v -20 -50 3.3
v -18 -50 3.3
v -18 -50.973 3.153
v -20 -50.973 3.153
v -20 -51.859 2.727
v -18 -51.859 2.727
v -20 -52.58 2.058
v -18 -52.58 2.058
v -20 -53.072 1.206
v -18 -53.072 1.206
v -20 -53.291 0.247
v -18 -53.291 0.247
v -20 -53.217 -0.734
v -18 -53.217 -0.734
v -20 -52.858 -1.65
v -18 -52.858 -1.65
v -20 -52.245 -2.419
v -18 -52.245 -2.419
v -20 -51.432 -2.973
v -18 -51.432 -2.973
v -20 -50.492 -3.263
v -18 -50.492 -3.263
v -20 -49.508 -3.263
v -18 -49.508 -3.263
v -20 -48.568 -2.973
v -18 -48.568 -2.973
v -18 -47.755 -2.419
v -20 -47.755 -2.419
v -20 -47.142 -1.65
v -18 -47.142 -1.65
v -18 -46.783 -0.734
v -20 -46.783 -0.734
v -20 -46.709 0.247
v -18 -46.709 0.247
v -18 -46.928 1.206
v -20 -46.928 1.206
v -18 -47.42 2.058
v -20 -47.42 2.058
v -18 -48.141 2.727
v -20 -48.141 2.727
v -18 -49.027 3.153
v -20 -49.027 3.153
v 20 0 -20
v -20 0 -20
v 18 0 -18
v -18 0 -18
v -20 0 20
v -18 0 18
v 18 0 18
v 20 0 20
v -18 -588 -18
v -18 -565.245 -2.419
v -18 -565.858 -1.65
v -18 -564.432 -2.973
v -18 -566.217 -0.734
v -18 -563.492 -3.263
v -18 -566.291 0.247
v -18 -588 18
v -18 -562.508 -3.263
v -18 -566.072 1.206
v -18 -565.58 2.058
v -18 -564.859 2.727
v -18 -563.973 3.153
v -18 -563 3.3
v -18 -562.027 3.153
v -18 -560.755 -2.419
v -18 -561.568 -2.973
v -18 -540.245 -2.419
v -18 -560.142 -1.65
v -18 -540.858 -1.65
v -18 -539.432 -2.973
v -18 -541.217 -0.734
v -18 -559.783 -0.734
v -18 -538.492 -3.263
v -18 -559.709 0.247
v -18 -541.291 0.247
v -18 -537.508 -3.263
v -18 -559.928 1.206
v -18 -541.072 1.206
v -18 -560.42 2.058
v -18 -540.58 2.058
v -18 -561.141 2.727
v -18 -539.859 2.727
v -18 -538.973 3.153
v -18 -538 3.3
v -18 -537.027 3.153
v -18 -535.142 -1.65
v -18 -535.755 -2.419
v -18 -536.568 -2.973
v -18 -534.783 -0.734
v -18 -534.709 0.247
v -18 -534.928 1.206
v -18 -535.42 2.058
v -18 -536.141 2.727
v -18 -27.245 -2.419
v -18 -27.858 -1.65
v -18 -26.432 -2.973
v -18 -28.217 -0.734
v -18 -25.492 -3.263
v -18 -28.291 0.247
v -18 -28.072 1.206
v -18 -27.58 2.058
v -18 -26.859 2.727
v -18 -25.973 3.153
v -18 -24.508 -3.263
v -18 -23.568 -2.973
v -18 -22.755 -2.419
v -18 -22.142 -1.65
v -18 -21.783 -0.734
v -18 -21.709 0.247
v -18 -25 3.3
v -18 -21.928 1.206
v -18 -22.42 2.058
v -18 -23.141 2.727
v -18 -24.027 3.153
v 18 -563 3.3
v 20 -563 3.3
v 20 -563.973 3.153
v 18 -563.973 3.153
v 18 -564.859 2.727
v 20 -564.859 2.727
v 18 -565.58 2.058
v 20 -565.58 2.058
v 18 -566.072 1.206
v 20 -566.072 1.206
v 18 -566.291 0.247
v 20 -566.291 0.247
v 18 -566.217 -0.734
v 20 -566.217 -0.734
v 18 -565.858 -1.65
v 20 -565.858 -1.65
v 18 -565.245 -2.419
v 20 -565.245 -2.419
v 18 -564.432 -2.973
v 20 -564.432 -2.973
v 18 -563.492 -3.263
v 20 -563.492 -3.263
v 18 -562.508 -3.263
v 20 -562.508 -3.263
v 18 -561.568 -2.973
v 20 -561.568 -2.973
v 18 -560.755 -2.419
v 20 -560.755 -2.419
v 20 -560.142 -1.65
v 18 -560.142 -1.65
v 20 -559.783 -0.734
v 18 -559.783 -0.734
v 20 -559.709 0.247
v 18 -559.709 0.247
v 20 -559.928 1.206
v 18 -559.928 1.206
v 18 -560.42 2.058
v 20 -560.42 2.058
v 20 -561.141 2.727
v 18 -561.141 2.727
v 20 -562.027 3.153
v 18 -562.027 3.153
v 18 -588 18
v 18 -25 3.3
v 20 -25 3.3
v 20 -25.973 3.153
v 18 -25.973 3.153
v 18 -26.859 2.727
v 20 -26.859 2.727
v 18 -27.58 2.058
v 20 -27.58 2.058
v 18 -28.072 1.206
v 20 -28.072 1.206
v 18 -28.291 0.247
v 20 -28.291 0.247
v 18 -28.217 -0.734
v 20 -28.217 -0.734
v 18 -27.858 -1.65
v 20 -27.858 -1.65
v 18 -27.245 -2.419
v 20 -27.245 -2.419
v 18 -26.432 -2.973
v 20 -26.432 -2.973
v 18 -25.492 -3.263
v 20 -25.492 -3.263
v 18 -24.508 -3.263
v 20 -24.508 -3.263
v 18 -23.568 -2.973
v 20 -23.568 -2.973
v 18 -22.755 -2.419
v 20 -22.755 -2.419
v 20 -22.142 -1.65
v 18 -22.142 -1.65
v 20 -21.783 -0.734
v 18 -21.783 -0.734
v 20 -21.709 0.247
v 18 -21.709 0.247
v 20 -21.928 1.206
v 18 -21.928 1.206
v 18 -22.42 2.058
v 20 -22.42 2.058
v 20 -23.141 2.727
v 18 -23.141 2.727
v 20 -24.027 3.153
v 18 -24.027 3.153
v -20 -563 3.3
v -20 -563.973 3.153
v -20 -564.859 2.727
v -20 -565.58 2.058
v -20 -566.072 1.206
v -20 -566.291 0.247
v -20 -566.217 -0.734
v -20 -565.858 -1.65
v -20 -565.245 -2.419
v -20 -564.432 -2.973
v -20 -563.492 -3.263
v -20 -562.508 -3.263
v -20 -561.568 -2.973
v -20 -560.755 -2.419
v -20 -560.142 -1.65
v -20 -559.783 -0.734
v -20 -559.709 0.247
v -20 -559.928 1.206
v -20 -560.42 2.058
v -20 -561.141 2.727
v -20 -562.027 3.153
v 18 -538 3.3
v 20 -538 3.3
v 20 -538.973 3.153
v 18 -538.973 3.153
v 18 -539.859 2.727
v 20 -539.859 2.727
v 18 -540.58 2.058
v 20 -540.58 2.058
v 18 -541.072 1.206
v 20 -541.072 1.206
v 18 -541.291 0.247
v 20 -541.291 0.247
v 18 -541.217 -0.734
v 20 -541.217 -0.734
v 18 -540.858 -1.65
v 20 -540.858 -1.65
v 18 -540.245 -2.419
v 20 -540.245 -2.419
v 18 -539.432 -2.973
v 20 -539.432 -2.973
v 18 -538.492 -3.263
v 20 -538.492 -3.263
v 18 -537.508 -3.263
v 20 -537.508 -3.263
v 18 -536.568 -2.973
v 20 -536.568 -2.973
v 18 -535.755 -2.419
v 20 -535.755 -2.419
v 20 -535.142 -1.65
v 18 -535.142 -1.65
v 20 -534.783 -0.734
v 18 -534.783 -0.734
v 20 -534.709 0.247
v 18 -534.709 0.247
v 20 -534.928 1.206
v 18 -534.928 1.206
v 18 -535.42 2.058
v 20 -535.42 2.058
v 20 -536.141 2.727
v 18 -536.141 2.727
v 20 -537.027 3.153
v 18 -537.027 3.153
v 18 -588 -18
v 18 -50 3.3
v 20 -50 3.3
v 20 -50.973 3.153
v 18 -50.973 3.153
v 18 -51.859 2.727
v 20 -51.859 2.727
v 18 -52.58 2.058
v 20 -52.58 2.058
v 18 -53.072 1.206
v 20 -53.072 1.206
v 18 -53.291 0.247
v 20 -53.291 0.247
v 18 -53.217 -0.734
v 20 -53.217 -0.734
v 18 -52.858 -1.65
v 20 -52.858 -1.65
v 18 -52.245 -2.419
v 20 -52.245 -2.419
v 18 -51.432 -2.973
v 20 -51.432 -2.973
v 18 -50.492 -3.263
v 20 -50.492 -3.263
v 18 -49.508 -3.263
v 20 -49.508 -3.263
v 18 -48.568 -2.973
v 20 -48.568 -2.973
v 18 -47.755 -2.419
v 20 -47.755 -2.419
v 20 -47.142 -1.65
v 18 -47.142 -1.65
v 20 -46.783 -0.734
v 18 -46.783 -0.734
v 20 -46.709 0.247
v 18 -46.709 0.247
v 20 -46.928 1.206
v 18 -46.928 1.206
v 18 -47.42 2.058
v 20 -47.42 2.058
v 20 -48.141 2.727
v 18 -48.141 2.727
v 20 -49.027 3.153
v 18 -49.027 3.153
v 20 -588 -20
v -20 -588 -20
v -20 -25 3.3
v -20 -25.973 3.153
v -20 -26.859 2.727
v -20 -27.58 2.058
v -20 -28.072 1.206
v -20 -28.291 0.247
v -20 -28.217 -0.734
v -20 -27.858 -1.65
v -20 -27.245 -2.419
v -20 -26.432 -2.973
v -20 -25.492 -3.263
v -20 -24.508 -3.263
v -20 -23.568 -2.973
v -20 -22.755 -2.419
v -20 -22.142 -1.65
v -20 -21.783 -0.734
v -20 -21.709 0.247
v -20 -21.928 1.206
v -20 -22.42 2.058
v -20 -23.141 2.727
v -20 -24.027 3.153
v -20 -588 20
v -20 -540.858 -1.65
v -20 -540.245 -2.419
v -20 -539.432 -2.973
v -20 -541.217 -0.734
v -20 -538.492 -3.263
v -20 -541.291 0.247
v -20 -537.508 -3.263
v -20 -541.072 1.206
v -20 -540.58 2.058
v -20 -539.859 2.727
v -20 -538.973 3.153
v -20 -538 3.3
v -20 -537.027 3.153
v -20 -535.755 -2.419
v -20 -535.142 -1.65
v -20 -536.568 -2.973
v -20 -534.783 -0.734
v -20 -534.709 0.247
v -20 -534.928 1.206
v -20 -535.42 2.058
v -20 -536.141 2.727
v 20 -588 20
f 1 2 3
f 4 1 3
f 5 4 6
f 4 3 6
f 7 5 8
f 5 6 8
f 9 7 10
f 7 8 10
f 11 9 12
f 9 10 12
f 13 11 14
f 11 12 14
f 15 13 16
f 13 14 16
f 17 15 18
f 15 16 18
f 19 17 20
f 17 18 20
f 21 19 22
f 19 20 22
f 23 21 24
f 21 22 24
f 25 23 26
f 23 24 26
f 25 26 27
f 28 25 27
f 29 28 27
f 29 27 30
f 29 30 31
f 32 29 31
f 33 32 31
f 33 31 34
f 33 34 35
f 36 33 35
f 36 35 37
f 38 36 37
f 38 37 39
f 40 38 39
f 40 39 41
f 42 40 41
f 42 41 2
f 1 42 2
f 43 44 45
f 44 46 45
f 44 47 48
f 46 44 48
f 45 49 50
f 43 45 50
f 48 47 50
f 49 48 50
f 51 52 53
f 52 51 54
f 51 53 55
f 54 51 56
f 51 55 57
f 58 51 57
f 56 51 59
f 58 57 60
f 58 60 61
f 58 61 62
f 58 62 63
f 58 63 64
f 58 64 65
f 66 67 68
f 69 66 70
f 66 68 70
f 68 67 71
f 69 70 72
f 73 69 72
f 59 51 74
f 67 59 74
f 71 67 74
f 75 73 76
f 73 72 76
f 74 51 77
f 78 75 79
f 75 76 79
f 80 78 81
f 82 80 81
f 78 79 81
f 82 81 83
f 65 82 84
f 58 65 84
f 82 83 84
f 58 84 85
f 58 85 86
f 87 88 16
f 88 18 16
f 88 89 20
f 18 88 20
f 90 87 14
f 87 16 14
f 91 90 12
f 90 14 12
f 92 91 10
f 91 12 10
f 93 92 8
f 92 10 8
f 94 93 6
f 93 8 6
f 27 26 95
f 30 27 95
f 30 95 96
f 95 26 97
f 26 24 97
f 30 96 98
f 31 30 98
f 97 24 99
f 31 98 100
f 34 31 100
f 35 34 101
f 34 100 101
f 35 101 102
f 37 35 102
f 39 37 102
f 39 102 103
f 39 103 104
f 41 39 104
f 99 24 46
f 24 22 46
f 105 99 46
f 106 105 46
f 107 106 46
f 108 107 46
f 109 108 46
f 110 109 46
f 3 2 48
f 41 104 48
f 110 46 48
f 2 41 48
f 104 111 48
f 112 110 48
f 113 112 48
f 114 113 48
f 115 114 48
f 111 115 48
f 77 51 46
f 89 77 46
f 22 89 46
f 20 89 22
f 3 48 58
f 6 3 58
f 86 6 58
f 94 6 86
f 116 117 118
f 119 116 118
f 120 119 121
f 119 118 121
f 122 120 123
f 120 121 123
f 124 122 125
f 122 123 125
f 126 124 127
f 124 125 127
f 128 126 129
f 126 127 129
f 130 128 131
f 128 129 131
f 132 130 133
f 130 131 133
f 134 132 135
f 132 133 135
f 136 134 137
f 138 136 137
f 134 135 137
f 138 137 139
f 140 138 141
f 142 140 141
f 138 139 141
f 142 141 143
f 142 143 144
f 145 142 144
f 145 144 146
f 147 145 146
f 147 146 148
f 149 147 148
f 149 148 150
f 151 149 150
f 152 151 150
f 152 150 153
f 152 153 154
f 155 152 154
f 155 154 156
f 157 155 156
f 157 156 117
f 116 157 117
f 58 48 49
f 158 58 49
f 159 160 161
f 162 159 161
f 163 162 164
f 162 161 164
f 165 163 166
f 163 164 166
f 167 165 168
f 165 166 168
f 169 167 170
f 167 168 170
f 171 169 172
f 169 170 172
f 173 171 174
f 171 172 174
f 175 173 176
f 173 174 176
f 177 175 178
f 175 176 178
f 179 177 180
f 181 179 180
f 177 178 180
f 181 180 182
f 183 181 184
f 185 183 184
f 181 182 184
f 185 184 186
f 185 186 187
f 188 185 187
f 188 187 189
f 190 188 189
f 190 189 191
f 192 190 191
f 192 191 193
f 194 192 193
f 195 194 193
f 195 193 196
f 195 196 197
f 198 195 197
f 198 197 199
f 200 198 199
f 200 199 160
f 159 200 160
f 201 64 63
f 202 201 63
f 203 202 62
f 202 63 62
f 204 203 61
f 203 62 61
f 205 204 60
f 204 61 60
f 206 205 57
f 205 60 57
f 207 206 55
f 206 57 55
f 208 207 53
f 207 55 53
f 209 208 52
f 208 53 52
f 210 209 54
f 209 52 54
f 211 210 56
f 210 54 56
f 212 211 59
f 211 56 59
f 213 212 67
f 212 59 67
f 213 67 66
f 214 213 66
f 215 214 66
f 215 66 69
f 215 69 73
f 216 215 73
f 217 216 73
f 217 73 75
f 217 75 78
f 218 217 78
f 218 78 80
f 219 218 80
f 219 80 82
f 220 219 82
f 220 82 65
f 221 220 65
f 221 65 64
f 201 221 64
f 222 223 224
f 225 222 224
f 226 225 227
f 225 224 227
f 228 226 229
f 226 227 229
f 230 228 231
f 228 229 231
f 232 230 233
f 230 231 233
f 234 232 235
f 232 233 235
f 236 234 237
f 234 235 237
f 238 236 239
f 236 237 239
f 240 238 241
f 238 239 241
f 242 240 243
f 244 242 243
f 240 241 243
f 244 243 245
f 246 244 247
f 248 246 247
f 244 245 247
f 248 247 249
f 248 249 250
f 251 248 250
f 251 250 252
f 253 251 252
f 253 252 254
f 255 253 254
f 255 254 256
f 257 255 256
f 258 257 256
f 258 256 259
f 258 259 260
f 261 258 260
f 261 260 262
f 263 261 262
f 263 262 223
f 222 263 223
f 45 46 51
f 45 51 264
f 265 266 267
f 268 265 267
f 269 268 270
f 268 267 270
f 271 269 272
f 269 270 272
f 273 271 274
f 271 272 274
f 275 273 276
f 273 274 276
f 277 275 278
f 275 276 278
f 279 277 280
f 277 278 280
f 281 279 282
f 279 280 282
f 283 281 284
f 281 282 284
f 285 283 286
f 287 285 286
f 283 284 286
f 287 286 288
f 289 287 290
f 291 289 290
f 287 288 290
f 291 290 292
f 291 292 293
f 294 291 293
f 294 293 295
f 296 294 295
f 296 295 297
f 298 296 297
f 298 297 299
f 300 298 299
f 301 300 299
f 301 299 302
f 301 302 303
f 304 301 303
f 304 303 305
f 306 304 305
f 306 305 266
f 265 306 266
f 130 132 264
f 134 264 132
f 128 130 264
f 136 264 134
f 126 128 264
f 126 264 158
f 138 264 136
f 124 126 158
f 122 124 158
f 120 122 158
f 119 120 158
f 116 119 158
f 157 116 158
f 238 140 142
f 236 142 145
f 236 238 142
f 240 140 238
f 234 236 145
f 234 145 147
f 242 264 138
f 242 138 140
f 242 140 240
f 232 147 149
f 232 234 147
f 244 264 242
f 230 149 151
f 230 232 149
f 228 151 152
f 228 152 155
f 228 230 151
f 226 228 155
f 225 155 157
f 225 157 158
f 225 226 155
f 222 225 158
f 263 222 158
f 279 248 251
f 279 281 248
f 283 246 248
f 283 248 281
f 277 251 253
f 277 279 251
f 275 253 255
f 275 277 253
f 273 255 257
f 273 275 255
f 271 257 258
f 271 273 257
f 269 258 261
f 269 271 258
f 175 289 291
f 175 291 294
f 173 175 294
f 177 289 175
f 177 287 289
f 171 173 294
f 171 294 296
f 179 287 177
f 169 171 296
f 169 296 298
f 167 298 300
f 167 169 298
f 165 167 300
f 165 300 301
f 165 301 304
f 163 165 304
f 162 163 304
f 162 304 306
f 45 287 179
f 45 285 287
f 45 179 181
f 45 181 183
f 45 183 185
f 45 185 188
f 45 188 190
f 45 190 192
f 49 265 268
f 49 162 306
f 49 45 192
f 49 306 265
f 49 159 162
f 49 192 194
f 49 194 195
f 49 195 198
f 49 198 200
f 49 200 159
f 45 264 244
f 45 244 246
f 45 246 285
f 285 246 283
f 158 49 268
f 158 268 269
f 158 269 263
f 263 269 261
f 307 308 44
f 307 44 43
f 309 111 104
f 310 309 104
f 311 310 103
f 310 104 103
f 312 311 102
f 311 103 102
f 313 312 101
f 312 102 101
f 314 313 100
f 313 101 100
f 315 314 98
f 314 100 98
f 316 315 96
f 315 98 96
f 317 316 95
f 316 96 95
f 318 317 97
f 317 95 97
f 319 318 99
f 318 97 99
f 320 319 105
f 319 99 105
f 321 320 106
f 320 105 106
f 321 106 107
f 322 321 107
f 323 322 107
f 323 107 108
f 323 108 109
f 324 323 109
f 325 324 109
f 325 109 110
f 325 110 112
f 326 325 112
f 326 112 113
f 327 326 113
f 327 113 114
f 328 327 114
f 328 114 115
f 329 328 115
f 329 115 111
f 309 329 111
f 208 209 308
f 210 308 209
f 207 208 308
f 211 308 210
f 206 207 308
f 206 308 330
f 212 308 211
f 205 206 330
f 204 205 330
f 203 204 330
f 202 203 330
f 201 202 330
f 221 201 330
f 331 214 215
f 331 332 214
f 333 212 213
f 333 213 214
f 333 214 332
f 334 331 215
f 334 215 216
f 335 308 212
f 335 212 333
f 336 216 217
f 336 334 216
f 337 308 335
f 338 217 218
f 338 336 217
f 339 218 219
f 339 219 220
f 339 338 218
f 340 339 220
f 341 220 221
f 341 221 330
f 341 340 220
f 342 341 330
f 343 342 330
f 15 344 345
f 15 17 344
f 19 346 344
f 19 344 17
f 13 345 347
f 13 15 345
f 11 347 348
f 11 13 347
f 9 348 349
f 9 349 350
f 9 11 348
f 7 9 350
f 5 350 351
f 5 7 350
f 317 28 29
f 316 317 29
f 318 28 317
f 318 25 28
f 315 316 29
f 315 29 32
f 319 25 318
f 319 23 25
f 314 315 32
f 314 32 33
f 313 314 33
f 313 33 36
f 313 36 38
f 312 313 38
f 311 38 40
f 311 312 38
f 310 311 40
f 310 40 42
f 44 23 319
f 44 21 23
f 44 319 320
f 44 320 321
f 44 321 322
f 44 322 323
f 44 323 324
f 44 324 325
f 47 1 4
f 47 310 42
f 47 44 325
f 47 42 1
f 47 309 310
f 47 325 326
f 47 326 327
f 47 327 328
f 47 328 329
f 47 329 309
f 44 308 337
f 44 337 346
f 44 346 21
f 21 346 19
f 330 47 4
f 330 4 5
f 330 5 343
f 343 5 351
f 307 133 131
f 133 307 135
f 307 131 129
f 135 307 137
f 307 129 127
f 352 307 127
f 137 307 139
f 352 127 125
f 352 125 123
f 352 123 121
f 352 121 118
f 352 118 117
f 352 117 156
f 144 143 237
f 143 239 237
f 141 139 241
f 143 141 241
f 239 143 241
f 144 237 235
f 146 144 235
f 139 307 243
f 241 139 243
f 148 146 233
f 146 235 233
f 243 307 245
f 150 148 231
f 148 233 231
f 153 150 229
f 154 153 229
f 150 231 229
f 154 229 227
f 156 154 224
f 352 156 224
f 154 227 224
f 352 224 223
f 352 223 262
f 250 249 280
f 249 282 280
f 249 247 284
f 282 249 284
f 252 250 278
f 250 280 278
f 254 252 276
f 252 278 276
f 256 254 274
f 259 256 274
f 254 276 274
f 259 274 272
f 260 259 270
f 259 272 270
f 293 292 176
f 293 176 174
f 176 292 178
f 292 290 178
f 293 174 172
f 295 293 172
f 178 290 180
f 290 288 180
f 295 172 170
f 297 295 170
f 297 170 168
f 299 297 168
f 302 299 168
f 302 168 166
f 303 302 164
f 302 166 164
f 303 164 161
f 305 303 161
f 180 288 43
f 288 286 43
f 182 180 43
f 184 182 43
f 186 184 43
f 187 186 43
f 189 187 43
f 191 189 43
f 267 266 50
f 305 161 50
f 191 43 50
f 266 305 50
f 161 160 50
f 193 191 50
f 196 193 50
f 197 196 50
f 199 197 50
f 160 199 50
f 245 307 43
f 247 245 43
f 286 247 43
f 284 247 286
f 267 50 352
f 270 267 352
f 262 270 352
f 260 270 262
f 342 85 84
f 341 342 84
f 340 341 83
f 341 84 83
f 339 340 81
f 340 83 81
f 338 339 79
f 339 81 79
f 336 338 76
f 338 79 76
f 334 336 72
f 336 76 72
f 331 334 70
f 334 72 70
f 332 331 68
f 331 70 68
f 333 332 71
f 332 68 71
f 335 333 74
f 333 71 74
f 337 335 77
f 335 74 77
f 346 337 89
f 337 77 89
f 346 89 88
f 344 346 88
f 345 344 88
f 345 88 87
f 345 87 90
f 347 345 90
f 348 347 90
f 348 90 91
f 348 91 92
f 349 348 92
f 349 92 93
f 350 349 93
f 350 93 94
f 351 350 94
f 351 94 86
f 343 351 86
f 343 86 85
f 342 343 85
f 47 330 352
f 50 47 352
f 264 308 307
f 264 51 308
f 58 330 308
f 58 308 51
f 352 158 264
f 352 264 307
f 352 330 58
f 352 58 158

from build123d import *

# Parameters (mm, degrees)
SKETCH_W    = 40
SKETCH_H    = 40
SKETCH_W_2  = 36
SKETCH_H_2  = 36
PAD_DEPTH   = 588
SKETCH001_R = 3.3
HOLE_DEPTH  = 40.001


with BuildPart() as part:
    # Sketch → Pad (new body)
    with BuildSketch(Plane.XZ):
        Rectangle(SKETCH_W, SKETCH_H)
        Rectangle(SKETCH_W_2, SKETCH_H_2, mode=Mode.SUBTRACT)
    extrude(amount=PAD_DEPTH)

    # Sketch001 → Hole (cut, through all)
    with BuildSketch(Plane(origin=(20, 0, 0), x_dir=(0, 0, 1), z_dir=(1, 0, 0))):
        with Locations((0, 25)):
            Circle(SKETCH001_R)
        with Locations((0, 50)):
            Circle(SKETCH001_R)
        with Locations((0, 563)):
            Circle(SKETCH001_R)
        with Locations((0, 538)):
            Circle(SKETCH001_R)
    extrude(amount=-HOLE_DEPTH, mode=Mode.SUBTRACT)


solid = part.part
